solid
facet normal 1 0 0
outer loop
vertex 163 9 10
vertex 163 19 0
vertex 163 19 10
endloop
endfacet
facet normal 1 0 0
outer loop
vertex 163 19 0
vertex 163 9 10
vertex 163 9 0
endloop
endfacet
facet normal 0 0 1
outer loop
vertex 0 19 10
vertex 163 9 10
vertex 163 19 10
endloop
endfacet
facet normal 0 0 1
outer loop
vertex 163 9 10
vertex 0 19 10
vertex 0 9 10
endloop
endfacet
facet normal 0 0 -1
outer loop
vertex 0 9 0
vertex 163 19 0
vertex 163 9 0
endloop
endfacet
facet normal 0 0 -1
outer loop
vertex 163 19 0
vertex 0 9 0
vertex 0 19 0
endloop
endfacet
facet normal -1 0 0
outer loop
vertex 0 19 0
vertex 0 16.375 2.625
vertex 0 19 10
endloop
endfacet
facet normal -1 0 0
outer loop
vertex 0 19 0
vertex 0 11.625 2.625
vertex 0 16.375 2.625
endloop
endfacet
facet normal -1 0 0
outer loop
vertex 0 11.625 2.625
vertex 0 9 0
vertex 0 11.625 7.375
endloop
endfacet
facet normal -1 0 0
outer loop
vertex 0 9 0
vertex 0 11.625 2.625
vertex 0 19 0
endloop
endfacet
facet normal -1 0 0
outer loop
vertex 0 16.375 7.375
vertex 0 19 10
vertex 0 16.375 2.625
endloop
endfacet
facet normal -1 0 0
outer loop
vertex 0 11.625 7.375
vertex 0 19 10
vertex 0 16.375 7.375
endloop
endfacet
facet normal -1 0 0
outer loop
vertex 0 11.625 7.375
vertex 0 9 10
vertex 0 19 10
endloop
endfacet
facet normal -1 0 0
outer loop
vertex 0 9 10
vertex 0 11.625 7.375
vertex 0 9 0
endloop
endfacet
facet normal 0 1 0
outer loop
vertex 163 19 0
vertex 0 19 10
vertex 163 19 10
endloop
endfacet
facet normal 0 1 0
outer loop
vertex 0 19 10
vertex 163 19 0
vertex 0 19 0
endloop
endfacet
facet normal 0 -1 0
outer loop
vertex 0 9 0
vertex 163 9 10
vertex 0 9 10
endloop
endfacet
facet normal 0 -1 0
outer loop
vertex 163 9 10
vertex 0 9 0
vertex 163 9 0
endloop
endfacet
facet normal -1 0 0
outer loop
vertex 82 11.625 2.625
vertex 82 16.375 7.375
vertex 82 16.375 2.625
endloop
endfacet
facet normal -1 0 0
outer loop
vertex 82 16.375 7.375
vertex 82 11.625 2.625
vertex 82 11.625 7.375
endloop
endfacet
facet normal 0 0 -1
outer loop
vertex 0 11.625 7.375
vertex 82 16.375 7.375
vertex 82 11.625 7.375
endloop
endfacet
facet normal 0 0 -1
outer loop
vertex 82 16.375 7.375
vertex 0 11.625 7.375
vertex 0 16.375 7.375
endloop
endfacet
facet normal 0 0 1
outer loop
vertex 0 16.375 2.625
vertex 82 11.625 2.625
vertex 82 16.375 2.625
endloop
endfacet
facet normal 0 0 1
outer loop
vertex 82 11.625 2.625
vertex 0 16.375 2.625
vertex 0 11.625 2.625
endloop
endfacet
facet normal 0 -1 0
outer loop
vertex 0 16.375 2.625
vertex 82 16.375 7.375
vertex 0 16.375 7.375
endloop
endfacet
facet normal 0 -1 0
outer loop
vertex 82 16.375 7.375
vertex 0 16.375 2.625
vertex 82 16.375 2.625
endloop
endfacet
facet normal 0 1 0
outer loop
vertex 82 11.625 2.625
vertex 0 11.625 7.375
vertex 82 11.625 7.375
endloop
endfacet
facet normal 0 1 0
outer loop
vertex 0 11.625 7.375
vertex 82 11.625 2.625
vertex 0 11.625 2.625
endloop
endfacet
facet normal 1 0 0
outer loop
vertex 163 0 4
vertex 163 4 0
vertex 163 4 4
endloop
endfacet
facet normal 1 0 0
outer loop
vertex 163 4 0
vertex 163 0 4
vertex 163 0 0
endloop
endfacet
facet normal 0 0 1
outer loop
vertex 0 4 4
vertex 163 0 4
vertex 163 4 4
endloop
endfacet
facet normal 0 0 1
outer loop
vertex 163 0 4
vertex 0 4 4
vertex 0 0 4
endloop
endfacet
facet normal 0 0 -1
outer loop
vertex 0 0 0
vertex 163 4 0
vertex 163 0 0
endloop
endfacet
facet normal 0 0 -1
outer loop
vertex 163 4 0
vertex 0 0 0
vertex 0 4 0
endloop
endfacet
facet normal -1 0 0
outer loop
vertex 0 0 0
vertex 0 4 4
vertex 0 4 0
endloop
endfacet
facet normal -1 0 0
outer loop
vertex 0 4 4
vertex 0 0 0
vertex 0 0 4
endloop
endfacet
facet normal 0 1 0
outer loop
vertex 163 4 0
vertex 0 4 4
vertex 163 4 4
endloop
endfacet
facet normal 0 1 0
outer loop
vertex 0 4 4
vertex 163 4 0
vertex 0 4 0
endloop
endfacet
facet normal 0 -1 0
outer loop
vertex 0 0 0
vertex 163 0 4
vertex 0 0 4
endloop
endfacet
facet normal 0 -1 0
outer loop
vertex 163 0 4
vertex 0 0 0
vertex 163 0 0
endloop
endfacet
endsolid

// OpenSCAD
// Anzeige-Optionen
show_pin = true;
show_strut = true;
show_section = false;  // Schnittansicht für Strut
spacing = 5;

// Parameter
pin_length = 163;
pin_width = 4;
pin_height = 4;
strut_length = 163;
strut_width = 10;
strut_height = 10;

hole_width = 4.75;
hole_height = 4.75;
hole_depth = 82;
if (show_pin) {
    cube([pin_length, pin_width, pin_height]);
}

// Support-Strut
if (show_strut) {
    translate([0, pin_width + spacing, 0]) {
        if (show_section) {
            intersection() {
                translate([-1, -1, -1])
                    cube([strut_length+2, strut_width/2+1, strut_height+2]);
                difference() {
                    cube([strut_length, strut_width, strut_height]);
                    translate([0, (strut_width-hole_width)/2, (strut_height-hole_height)/2])
                        cube([hole_depth, hole_width, hole_height]);
                }
            }
        } else {
            difference() {
                cube([strut_length, strut_width, strut_height]);
                translate([0, (strut_width-hole_width)/2, (strut_height-hole_height)/2])
                    cube([hole_depth, hole_width, hole_height]);
            }
        }
    }
}
